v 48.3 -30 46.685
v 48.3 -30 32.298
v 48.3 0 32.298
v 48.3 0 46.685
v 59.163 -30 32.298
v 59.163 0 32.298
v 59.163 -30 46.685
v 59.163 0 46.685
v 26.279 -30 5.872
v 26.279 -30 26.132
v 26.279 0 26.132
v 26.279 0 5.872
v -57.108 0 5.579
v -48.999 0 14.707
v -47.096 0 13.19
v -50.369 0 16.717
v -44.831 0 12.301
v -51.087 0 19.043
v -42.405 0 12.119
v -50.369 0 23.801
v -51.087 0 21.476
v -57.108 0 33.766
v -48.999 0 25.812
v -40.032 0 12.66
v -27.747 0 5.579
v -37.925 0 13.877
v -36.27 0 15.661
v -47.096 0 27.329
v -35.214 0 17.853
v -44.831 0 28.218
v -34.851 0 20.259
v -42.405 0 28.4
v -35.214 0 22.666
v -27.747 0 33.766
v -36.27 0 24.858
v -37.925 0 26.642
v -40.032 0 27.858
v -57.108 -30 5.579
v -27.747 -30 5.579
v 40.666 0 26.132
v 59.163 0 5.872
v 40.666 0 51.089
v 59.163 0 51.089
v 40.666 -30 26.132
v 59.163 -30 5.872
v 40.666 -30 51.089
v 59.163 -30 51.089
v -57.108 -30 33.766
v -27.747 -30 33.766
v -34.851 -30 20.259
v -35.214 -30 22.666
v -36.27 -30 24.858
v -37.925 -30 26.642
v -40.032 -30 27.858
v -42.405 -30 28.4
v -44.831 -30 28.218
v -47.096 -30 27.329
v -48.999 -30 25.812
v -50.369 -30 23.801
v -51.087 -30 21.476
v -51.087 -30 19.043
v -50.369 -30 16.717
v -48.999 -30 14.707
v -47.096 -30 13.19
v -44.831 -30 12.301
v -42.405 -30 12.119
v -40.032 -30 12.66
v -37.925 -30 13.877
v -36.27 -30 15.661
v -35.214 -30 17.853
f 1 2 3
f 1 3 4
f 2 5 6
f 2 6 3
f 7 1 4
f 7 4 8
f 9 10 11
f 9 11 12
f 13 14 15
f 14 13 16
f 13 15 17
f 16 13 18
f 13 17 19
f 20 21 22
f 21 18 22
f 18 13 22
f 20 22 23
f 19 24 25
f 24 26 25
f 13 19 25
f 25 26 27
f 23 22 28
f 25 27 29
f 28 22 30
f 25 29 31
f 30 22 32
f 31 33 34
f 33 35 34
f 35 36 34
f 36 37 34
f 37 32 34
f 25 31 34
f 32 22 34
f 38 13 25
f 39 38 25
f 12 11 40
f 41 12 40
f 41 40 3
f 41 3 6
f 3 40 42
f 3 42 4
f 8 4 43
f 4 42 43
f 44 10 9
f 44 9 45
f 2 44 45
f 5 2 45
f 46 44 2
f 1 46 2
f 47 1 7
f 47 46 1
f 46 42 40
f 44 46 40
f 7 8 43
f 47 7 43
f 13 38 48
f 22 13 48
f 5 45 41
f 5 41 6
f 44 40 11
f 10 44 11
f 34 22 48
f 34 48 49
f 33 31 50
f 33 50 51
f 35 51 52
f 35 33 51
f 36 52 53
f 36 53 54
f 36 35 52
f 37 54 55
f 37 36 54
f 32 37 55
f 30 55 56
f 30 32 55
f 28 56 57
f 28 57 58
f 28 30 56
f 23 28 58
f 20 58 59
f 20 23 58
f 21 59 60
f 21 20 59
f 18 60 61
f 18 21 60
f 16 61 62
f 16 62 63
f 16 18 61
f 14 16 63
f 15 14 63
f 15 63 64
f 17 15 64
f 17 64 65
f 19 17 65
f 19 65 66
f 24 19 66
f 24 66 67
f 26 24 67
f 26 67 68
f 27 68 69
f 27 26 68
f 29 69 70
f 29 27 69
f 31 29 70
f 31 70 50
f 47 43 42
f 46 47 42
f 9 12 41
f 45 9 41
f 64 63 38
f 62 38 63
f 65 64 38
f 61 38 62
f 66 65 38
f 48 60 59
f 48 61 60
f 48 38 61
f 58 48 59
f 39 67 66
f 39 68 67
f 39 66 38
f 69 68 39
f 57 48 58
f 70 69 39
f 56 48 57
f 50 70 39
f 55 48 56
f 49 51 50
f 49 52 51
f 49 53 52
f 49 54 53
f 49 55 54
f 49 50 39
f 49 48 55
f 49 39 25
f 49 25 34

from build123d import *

# Parameters (mm, degrees)
F0_W     = 29.361468
F0_H     = 28.18701
F0_R     = 8.163334
F1_DEPTH = 30


with BuildPart() as f1:
    # F0 (on Front) → F1 (new body)
    with BuildSketch(Plane.XZ):
        with Locations((-42.427322, 19.672184)):
            Rectangle(F0_W, F0_H)
        with Locations((-43.014552, 20.259414)):
            Circle(F0_R, mode=Mode.SUBTRACT)
        Polygon((40.665634, 26.131706), (26.278513, 26.131706), (26.278513, 5.872293), (59.163362, 5.872293), (59.163362, 26.131706), (59.163362, 32.297615), (48.299614, 32.297615), (48.299614, 46.684735), (59.163362, 46.684735), (59.163362, 51.088955), (48.299614, 51.088955), (40.665634, 51.088955), (40.665634, 32.297615), align=None)
    extrude(amount=F1_DEPTH)


solid = f1.part
